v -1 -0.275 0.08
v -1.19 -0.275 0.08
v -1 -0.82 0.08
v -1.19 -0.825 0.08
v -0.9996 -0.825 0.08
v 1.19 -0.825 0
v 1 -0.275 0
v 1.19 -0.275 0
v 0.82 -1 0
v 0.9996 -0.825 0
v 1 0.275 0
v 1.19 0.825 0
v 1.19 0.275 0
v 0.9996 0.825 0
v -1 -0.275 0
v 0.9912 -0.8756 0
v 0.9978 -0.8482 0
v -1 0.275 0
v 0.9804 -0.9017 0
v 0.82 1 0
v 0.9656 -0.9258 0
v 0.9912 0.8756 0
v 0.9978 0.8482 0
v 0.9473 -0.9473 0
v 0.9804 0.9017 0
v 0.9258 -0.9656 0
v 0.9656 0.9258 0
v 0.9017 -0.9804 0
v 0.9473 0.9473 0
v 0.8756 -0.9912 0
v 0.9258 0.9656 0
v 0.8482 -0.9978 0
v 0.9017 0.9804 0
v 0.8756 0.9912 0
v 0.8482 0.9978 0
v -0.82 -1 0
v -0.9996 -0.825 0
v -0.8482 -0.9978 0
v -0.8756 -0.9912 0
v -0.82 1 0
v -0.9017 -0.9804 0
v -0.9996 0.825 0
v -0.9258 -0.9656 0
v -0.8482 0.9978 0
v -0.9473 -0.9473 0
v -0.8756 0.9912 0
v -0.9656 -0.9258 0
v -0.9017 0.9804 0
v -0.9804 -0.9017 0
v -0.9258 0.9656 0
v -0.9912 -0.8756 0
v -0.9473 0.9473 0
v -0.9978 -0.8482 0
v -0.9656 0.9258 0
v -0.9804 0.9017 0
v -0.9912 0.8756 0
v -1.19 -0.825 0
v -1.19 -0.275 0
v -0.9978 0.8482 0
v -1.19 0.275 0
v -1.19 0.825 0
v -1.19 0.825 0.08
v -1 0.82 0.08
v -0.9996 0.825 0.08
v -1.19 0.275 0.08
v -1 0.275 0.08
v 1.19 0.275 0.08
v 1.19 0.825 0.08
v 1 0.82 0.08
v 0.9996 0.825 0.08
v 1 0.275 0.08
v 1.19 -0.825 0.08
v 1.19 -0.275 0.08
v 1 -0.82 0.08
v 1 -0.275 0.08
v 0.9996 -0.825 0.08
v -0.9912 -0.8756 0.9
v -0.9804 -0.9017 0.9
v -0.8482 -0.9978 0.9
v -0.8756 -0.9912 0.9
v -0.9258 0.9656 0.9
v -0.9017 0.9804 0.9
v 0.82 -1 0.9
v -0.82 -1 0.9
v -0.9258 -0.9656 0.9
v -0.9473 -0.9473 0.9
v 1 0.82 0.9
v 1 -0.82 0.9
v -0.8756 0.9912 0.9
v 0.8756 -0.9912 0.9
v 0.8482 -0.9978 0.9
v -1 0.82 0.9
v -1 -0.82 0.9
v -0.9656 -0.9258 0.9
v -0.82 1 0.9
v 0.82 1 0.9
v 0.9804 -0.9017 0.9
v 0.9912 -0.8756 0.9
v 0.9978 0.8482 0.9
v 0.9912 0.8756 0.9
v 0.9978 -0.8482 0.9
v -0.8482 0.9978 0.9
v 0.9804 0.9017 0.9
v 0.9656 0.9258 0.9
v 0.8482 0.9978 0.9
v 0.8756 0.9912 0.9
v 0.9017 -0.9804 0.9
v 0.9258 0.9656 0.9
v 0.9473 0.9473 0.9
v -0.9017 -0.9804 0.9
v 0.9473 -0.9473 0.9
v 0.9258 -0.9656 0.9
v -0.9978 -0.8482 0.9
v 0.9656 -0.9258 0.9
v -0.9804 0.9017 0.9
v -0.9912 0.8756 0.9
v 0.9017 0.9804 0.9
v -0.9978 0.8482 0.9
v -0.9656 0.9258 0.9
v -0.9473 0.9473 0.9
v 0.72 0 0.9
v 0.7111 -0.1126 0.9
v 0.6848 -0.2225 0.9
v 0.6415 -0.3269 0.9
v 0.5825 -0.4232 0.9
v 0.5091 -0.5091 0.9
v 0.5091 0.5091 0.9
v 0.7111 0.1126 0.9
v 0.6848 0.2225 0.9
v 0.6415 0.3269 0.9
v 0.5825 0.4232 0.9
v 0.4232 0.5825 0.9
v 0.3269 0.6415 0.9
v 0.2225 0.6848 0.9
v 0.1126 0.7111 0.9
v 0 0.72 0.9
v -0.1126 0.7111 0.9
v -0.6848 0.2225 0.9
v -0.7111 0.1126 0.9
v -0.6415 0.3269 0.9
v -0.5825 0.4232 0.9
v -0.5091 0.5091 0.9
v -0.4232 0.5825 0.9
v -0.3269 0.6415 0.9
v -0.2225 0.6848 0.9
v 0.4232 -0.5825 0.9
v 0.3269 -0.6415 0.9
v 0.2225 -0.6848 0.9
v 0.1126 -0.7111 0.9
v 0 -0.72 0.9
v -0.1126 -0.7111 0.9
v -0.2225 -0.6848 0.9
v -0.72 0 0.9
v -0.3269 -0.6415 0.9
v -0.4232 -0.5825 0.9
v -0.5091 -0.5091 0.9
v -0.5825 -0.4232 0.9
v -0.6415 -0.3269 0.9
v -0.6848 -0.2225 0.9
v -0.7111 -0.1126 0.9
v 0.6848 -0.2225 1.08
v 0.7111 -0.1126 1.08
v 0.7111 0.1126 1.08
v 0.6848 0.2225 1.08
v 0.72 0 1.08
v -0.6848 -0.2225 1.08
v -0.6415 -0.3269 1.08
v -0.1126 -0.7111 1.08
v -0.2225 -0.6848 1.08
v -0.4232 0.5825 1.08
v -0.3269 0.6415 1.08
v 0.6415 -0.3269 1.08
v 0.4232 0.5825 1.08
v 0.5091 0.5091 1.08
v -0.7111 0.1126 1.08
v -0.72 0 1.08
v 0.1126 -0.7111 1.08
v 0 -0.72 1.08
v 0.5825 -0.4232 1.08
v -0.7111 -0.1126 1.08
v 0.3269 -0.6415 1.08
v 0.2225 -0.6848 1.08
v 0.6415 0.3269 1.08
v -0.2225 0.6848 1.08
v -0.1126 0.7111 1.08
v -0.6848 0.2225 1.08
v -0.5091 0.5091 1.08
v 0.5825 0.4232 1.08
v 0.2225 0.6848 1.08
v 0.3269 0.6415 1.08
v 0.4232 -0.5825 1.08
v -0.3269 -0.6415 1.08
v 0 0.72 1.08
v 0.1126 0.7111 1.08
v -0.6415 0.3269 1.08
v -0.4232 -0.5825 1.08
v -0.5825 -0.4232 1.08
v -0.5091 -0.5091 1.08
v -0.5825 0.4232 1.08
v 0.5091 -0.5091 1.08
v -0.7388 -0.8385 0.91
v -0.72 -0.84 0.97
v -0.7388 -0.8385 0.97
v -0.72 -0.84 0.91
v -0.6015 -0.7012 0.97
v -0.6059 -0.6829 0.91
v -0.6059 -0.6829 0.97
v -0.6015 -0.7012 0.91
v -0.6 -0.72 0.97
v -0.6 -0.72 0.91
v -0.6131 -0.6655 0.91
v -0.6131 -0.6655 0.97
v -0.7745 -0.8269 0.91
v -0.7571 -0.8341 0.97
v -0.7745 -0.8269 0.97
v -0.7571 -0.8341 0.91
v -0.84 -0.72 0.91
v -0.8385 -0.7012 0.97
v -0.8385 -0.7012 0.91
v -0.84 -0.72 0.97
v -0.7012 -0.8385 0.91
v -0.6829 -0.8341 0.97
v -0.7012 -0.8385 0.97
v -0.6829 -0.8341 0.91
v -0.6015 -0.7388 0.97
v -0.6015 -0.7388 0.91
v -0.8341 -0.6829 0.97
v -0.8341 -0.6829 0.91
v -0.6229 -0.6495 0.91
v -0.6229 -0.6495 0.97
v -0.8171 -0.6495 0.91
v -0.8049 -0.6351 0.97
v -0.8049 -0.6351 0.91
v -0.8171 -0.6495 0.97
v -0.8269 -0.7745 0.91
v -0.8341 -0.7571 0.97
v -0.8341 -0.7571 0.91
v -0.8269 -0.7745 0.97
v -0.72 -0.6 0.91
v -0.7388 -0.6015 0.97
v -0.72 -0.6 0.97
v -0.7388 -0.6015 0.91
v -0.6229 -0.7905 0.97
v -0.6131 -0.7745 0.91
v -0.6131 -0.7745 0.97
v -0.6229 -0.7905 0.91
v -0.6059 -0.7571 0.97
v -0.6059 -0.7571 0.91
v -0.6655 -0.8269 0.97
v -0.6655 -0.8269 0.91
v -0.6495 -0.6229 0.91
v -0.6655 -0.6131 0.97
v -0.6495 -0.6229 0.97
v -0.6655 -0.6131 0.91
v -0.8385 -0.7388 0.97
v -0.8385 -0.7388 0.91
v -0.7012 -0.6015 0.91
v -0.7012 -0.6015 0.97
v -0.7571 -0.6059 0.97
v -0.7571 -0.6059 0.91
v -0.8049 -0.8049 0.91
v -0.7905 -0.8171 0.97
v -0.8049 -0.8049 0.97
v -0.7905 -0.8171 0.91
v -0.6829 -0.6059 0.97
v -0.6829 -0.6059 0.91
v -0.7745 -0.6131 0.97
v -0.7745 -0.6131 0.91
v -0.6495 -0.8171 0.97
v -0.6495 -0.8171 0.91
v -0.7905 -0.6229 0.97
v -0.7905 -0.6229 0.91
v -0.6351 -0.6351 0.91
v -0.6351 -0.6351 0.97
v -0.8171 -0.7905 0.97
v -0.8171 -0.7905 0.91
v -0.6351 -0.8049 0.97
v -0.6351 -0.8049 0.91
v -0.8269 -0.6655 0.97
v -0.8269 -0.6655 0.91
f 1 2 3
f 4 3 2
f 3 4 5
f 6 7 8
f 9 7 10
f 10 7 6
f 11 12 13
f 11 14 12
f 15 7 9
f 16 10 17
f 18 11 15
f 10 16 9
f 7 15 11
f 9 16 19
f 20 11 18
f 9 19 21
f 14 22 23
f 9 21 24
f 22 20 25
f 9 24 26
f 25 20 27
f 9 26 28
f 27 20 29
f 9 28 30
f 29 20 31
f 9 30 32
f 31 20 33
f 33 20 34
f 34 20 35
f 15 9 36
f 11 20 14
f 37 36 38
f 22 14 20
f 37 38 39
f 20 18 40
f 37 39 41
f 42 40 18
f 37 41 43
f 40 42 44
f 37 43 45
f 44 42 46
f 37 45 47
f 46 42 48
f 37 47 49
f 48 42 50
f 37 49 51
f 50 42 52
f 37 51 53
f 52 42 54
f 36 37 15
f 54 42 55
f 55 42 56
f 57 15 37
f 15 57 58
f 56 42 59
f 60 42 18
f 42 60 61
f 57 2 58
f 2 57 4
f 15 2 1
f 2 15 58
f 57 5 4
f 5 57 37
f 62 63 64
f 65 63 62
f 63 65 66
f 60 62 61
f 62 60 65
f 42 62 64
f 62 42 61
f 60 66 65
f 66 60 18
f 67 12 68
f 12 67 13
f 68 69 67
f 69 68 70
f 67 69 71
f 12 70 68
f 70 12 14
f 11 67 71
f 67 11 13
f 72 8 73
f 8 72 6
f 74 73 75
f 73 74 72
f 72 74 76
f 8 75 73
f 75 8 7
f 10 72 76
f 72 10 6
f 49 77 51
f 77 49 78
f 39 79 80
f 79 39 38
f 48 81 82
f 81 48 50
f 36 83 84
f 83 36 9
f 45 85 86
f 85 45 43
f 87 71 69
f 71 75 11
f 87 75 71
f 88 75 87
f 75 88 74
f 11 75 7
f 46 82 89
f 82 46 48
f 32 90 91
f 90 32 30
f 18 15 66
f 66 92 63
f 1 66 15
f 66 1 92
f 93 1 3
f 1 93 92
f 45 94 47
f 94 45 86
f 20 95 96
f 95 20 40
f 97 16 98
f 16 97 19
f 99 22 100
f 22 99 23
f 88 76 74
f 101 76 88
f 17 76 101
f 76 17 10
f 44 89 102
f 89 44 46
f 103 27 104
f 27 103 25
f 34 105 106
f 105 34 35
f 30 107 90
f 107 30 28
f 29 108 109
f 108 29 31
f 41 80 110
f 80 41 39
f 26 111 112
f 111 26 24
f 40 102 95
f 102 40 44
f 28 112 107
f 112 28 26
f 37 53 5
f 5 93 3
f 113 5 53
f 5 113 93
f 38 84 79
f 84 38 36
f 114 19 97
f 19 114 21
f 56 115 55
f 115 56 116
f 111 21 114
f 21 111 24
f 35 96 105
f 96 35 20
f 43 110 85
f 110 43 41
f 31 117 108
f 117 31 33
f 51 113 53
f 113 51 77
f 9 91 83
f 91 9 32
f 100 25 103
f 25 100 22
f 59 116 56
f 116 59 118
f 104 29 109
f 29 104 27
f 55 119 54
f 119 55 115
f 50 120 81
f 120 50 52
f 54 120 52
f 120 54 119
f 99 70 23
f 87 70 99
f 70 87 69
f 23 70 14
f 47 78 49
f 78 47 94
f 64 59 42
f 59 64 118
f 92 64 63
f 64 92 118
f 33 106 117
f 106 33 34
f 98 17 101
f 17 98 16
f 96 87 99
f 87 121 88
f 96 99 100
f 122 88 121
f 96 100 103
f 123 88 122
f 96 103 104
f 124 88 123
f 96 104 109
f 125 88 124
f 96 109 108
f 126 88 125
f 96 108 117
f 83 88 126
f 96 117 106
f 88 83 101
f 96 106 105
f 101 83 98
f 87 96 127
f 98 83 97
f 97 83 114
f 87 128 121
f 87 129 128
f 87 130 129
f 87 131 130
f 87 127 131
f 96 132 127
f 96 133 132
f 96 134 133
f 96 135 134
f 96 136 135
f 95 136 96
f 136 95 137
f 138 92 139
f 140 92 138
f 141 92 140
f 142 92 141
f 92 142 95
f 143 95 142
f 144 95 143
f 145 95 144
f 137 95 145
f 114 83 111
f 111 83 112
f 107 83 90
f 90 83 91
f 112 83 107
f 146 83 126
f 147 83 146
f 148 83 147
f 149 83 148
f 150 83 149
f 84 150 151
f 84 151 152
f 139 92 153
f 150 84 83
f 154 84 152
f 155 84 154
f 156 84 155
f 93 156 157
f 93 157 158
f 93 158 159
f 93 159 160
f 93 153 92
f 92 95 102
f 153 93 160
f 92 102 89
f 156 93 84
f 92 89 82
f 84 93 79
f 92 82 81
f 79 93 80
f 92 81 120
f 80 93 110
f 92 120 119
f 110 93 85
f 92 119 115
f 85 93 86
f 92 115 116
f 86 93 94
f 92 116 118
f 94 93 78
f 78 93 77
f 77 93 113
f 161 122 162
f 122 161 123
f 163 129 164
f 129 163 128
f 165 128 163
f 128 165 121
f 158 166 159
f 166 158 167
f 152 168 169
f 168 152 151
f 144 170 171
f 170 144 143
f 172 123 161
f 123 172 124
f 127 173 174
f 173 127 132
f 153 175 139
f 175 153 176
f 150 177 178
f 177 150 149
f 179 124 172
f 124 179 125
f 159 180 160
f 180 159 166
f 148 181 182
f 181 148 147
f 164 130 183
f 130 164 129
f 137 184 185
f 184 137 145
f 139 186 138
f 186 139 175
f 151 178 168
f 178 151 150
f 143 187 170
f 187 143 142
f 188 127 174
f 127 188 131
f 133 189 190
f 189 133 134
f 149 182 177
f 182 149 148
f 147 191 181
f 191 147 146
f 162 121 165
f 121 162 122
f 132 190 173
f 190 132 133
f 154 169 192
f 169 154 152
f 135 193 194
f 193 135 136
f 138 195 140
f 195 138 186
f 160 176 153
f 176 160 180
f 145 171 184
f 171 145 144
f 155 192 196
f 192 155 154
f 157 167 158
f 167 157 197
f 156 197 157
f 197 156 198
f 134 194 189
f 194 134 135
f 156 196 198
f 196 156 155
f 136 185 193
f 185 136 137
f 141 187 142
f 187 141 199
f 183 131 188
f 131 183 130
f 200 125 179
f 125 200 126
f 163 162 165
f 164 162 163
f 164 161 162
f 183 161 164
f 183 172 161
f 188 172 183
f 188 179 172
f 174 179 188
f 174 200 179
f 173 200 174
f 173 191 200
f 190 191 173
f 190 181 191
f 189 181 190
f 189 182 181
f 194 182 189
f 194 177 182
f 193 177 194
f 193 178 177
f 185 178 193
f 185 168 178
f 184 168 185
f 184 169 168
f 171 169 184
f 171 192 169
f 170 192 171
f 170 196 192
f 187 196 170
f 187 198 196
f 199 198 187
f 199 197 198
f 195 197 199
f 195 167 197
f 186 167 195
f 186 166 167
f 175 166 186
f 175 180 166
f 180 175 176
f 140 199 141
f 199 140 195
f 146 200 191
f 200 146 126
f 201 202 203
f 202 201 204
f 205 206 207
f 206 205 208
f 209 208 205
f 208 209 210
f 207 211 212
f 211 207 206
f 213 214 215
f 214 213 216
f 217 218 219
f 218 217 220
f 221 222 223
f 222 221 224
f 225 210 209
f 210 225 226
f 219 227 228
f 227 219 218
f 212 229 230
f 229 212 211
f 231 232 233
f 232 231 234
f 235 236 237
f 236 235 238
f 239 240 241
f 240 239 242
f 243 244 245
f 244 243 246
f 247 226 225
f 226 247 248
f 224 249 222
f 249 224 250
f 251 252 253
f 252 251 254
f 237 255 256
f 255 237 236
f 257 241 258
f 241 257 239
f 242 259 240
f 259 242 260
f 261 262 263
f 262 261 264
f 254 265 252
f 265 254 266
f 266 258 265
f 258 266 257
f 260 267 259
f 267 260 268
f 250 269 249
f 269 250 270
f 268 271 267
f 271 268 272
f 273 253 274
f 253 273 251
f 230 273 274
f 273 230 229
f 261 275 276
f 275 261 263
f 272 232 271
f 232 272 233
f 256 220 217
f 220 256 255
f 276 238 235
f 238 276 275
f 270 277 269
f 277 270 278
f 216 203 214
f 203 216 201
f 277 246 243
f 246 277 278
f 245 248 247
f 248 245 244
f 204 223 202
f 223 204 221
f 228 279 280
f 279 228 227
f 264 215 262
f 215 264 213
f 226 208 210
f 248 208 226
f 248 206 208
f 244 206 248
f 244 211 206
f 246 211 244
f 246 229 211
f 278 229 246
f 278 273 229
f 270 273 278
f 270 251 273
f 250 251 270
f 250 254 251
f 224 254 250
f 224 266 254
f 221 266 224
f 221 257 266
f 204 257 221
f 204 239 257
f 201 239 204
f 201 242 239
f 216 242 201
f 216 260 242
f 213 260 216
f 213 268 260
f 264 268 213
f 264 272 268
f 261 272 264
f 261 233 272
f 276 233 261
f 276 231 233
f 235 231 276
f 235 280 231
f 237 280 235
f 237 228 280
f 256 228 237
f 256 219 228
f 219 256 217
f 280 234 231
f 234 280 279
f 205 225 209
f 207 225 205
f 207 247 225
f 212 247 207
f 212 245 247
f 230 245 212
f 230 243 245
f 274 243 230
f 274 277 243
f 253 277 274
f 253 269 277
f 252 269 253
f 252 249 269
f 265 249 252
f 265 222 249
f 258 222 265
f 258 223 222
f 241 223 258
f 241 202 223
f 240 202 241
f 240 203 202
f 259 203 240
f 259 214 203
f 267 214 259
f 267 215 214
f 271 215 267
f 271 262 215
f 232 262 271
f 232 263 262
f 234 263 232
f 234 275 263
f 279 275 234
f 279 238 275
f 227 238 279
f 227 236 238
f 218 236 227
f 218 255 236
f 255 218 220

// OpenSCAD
// LED_WS2812B-2020 2.0×2.0 — pads (±0.915, ±0.55)
$fn = 40;

body = 2.0;
h = 0.90;
pad = 0.55;
pad_t = 0.08;
lens_r = 0.72;
lens_h = 0.18;

module pad_at(x, y) {
  translate([x, y, pad_t / 2]) cube([pad, pad, pad_t], center = true);
}

module rounded_sq(s, hh, r = 0.2) {
  hull()
    for (sx = [-1, 1], sy = [-1, 1])
      translate([sx * (s / 2 - r), sy * (s / 2 - r), 0])
        cylinder(h = hh, r = r);
}

color([0.05, 0.05, 0.06])
  rounded_sq(body, h, 0.18);

// 发光面
color([0.75, 0.88, 1.0])
  translate([0, 0, h])
    cylinder(h = lens_h, r = lens_r);

// pin1 角标
color("white")
  translate([-0.72, -0.72, h + 0.01])
    cylinder(h = 0.06, r = 0.12);

color("gold") {
  pad_at(-0.915, -0.55);
  pad_at(-0.915,  0.55);
  pad_at( 0.915,  0.55);
  pad_at( 0.915, -0.55);
}
